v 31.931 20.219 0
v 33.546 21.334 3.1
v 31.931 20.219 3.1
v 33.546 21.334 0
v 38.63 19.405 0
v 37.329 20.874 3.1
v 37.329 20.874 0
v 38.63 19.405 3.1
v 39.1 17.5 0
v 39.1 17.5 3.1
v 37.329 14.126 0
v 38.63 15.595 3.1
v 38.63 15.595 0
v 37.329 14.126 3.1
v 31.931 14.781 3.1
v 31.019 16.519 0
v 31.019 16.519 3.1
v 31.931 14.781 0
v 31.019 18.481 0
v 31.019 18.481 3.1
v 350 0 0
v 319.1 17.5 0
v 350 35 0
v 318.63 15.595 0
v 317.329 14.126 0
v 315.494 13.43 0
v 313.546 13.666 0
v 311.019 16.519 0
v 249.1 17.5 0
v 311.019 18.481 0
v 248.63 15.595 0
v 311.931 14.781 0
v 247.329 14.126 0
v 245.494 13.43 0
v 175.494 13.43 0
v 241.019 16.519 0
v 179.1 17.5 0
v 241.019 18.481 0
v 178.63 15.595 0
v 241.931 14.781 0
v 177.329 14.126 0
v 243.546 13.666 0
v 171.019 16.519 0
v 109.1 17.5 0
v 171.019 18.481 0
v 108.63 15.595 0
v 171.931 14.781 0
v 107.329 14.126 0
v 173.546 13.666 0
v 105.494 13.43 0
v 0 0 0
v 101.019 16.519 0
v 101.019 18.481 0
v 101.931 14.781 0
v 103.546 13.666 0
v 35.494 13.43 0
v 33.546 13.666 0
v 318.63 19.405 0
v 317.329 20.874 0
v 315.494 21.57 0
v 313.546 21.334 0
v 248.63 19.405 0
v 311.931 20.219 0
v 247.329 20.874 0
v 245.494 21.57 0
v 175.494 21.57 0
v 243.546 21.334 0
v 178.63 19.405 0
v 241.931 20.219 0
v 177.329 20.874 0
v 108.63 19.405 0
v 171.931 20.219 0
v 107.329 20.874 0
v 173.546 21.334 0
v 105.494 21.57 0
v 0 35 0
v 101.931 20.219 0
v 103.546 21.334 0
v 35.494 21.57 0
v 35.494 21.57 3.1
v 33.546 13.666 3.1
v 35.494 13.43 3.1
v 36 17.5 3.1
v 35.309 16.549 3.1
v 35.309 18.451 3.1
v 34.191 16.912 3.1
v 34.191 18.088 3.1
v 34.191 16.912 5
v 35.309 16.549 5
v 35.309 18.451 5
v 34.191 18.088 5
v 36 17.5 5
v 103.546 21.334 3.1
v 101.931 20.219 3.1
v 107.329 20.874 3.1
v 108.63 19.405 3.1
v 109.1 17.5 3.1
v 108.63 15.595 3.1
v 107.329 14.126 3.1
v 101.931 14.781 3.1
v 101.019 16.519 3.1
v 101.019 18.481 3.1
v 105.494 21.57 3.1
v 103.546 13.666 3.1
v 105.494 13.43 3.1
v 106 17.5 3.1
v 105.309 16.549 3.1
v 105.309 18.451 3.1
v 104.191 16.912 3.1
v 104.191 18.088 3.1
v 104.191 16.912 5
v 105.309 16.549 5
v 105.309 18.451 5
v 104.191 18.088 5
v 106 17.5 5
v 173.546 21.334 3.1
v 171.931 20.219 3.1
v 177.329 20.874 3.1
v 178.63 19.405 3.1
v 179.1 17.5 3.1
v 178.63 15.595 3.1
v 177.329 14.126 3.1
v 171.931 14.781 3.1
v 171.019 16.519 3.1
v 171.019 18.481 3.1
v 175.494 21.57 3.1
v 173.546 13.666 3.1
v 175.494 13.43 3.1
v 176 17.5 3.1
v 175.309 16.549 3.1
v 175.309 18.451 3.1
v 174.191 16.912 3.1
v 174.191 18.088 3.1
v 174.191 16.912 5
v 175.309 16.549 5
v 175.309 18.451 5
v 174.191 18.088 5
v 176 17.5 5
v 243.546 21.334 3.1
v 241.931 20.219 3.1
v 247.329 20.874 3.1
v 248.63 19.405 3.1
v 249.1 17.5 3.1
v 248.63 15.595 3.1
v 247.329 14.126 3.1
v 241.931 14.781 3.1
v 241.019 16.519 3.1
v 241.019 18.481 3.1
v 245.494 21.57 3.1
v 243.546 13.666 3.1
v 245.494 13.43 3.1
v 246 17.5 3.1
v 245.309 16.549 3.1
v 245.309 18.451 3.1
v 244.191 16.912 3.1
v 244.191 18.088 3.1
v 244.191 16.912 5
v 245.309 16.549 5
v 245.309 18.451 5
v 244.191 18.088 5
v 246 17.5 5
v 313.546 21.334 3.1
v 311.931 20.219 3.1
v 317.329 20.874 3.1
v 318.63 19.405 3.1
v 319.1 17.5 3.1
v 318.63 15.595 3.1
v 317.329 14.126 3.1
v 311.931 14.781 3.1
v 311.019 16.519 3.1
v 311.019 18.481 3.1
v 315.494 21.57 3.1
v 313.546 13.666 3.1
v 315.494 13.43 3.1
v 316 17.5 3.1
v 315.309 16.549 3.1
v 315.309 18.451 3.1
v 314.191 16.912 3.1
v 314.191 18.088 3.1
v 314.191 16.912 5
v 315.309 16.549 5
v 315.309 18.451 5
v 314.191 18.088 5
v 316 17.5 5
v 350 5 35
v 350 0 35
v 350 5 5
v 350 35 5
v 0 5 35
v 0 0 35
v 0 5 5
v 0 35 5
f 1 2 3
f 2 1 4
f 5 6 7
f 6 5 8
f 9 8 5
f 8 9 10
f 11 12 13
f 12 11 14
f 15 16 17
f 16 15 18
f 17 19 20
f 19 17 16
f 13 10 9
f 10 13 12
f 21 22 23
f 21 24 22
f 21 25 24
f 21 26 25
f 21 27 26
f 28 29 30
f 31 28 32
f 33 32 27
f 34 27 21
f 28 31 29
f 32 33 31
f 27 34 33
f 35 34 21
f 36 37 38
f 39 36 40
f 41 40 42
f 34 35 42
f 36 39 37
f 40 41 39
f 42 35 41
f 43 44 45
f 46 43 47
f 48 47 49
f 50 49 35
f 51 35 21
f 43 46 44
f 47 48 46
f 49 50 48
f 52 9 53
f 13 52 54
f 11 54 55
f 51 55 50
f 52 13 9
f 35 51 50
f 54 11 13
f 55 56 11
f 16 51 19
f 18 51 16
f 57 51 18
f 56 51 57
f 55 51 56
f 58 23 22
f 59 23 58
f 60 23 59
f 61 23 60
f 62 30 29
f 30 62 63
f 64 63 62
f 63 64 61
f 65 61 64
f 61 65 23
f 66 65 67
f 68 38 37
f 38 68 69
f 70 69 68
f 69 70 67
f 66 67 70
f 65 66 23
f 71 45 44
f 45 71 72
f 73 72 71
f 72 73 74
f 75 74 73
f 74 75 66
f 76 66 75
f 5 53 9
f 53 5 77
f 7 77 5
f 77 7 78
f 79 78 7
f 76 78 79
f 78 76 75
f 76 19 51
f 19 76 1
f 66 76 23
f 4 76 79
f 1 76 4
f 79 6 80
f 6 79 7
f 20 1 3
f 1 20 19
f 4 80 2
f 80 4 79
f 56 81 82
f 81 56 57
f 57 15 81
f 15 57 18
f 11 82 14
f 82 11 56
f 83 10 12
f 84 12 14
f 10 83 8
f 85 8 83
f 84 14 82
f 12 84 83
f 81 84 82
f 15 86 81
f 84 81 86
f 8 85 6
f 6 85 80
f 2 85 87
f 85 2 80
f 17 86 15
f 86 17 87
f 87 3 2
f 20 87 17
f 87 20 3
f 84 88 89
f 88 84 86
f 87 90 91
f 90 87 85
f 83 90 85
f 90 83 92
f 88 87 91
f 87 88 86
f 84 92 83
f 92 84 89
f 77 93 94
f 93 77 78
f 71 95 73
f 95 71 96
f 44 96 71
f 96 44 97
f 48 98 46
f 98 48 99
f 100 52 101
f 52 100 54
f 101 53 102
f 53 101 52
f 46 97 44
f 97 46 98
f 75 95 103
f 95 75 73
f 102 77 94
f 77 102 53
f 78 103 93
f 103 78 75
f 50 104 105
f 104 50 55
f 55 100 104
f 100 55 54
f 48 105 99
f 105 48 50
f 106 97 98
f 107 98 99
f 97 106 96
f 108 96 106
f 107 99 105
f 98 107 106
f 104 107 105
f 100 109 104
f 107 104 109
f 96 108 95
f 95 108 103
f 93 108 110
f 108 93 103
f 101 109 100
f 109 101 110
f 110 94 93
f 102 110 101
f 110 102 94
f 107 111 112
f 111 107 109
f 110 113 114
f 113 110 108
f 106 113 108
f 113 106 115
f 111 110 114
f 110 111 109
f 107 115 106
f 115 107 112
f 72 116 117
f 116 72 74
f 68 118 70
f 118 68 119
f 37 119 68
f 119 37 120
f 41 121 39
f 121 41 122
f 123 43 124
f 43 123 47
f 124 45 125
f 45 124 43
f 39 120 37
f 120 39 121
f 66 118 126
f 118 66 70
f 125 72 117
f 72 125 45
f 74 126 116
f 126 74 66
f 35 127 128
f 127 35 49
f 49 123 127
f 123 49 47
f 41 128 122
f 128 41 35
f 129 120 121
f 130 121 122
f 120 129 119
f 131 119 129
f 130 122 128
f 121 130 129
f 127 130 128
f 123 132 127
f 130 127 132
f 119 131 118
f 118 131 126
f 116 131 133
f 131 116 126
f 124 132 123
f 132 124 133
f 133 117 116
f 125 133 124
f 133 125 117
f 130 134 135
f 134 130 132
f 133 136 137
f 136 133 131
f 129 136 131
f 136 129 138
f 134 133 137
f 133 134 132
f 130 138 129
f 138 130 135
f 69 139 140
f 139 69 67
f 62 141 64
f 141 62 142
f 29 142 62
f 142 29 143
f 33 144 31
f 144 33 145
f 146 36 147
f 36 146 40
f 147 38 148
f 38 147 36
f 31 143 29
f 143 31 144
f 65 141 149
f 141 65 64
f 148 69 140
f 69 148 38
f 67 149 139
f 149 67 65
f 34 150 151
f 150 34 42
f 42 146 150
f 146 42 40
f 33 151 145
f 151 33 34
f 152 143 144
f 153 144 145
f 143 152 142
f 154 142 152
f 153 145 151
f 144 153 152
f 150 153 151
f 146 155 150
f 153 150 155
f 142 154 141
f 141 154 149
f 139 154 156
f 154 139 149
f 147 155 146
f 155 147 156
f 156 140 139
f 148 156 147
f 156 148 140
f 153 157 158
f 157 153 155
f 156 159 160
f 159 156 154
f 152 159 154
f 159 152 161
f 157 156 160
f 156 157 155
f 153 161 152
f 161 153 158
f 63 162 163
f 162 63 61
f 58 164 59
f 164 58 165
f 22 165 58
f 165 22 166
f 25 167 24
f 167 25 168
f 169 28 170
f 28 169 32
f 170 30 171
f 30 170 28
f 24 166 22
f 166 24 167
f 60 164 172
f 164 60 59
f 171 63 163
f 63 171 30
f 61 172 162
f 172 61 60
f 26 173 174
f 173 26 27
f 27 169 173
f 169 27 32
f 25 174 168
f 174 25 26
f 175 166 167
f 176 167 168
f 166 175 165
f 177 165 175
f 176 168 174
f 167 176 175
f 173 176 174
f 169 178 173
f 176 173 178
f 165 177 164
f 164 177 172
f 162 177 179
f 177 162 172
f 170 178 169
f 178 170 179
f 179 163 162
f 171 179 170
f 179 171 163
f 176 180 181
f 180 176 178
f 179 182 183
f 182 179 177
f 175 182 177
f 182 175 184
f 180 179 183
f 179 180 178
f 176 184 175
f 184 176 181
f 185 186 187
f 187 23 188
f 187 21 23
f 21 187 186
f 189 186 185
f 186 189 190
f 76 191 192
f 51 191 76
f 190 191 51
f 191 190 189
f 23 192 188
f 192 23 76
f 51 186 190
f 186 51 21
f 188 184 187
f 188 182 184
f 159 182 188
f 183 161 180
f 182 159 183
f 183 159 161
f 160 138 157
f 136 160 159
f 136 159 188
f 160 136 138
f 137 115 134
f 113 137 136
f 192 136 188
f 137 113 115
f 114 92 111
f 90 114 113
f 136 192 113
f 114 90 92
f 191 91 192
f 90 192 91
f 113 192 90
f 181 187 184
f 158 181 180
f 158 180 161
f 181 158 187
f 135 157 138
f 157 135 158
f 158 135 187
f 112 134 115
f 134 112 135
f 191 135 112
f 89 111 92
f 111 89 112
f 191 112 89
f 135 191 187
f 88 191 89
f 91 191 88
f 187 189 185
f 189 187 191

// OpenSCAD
//super simple tool box dividers
//short ones
//divider(170, 25.4);

//long ones
divider(350,35);

module divider (length, hnw){
//hnw = width and height
    difference(){
        cube([length,hnw,hnw]);
        translate([0,5,5]){cube([length,hnw,hnw]);}
        for (hole = [length/10:length/5:length]) {
            translate([hole,hnw/2,0]){#magnet();}
        }
    }
}

module magnet(){
    cylinder(h=3.1,d=8.2);
    translate([0,0,3]){cylinder(h=8,d=2);}
}
